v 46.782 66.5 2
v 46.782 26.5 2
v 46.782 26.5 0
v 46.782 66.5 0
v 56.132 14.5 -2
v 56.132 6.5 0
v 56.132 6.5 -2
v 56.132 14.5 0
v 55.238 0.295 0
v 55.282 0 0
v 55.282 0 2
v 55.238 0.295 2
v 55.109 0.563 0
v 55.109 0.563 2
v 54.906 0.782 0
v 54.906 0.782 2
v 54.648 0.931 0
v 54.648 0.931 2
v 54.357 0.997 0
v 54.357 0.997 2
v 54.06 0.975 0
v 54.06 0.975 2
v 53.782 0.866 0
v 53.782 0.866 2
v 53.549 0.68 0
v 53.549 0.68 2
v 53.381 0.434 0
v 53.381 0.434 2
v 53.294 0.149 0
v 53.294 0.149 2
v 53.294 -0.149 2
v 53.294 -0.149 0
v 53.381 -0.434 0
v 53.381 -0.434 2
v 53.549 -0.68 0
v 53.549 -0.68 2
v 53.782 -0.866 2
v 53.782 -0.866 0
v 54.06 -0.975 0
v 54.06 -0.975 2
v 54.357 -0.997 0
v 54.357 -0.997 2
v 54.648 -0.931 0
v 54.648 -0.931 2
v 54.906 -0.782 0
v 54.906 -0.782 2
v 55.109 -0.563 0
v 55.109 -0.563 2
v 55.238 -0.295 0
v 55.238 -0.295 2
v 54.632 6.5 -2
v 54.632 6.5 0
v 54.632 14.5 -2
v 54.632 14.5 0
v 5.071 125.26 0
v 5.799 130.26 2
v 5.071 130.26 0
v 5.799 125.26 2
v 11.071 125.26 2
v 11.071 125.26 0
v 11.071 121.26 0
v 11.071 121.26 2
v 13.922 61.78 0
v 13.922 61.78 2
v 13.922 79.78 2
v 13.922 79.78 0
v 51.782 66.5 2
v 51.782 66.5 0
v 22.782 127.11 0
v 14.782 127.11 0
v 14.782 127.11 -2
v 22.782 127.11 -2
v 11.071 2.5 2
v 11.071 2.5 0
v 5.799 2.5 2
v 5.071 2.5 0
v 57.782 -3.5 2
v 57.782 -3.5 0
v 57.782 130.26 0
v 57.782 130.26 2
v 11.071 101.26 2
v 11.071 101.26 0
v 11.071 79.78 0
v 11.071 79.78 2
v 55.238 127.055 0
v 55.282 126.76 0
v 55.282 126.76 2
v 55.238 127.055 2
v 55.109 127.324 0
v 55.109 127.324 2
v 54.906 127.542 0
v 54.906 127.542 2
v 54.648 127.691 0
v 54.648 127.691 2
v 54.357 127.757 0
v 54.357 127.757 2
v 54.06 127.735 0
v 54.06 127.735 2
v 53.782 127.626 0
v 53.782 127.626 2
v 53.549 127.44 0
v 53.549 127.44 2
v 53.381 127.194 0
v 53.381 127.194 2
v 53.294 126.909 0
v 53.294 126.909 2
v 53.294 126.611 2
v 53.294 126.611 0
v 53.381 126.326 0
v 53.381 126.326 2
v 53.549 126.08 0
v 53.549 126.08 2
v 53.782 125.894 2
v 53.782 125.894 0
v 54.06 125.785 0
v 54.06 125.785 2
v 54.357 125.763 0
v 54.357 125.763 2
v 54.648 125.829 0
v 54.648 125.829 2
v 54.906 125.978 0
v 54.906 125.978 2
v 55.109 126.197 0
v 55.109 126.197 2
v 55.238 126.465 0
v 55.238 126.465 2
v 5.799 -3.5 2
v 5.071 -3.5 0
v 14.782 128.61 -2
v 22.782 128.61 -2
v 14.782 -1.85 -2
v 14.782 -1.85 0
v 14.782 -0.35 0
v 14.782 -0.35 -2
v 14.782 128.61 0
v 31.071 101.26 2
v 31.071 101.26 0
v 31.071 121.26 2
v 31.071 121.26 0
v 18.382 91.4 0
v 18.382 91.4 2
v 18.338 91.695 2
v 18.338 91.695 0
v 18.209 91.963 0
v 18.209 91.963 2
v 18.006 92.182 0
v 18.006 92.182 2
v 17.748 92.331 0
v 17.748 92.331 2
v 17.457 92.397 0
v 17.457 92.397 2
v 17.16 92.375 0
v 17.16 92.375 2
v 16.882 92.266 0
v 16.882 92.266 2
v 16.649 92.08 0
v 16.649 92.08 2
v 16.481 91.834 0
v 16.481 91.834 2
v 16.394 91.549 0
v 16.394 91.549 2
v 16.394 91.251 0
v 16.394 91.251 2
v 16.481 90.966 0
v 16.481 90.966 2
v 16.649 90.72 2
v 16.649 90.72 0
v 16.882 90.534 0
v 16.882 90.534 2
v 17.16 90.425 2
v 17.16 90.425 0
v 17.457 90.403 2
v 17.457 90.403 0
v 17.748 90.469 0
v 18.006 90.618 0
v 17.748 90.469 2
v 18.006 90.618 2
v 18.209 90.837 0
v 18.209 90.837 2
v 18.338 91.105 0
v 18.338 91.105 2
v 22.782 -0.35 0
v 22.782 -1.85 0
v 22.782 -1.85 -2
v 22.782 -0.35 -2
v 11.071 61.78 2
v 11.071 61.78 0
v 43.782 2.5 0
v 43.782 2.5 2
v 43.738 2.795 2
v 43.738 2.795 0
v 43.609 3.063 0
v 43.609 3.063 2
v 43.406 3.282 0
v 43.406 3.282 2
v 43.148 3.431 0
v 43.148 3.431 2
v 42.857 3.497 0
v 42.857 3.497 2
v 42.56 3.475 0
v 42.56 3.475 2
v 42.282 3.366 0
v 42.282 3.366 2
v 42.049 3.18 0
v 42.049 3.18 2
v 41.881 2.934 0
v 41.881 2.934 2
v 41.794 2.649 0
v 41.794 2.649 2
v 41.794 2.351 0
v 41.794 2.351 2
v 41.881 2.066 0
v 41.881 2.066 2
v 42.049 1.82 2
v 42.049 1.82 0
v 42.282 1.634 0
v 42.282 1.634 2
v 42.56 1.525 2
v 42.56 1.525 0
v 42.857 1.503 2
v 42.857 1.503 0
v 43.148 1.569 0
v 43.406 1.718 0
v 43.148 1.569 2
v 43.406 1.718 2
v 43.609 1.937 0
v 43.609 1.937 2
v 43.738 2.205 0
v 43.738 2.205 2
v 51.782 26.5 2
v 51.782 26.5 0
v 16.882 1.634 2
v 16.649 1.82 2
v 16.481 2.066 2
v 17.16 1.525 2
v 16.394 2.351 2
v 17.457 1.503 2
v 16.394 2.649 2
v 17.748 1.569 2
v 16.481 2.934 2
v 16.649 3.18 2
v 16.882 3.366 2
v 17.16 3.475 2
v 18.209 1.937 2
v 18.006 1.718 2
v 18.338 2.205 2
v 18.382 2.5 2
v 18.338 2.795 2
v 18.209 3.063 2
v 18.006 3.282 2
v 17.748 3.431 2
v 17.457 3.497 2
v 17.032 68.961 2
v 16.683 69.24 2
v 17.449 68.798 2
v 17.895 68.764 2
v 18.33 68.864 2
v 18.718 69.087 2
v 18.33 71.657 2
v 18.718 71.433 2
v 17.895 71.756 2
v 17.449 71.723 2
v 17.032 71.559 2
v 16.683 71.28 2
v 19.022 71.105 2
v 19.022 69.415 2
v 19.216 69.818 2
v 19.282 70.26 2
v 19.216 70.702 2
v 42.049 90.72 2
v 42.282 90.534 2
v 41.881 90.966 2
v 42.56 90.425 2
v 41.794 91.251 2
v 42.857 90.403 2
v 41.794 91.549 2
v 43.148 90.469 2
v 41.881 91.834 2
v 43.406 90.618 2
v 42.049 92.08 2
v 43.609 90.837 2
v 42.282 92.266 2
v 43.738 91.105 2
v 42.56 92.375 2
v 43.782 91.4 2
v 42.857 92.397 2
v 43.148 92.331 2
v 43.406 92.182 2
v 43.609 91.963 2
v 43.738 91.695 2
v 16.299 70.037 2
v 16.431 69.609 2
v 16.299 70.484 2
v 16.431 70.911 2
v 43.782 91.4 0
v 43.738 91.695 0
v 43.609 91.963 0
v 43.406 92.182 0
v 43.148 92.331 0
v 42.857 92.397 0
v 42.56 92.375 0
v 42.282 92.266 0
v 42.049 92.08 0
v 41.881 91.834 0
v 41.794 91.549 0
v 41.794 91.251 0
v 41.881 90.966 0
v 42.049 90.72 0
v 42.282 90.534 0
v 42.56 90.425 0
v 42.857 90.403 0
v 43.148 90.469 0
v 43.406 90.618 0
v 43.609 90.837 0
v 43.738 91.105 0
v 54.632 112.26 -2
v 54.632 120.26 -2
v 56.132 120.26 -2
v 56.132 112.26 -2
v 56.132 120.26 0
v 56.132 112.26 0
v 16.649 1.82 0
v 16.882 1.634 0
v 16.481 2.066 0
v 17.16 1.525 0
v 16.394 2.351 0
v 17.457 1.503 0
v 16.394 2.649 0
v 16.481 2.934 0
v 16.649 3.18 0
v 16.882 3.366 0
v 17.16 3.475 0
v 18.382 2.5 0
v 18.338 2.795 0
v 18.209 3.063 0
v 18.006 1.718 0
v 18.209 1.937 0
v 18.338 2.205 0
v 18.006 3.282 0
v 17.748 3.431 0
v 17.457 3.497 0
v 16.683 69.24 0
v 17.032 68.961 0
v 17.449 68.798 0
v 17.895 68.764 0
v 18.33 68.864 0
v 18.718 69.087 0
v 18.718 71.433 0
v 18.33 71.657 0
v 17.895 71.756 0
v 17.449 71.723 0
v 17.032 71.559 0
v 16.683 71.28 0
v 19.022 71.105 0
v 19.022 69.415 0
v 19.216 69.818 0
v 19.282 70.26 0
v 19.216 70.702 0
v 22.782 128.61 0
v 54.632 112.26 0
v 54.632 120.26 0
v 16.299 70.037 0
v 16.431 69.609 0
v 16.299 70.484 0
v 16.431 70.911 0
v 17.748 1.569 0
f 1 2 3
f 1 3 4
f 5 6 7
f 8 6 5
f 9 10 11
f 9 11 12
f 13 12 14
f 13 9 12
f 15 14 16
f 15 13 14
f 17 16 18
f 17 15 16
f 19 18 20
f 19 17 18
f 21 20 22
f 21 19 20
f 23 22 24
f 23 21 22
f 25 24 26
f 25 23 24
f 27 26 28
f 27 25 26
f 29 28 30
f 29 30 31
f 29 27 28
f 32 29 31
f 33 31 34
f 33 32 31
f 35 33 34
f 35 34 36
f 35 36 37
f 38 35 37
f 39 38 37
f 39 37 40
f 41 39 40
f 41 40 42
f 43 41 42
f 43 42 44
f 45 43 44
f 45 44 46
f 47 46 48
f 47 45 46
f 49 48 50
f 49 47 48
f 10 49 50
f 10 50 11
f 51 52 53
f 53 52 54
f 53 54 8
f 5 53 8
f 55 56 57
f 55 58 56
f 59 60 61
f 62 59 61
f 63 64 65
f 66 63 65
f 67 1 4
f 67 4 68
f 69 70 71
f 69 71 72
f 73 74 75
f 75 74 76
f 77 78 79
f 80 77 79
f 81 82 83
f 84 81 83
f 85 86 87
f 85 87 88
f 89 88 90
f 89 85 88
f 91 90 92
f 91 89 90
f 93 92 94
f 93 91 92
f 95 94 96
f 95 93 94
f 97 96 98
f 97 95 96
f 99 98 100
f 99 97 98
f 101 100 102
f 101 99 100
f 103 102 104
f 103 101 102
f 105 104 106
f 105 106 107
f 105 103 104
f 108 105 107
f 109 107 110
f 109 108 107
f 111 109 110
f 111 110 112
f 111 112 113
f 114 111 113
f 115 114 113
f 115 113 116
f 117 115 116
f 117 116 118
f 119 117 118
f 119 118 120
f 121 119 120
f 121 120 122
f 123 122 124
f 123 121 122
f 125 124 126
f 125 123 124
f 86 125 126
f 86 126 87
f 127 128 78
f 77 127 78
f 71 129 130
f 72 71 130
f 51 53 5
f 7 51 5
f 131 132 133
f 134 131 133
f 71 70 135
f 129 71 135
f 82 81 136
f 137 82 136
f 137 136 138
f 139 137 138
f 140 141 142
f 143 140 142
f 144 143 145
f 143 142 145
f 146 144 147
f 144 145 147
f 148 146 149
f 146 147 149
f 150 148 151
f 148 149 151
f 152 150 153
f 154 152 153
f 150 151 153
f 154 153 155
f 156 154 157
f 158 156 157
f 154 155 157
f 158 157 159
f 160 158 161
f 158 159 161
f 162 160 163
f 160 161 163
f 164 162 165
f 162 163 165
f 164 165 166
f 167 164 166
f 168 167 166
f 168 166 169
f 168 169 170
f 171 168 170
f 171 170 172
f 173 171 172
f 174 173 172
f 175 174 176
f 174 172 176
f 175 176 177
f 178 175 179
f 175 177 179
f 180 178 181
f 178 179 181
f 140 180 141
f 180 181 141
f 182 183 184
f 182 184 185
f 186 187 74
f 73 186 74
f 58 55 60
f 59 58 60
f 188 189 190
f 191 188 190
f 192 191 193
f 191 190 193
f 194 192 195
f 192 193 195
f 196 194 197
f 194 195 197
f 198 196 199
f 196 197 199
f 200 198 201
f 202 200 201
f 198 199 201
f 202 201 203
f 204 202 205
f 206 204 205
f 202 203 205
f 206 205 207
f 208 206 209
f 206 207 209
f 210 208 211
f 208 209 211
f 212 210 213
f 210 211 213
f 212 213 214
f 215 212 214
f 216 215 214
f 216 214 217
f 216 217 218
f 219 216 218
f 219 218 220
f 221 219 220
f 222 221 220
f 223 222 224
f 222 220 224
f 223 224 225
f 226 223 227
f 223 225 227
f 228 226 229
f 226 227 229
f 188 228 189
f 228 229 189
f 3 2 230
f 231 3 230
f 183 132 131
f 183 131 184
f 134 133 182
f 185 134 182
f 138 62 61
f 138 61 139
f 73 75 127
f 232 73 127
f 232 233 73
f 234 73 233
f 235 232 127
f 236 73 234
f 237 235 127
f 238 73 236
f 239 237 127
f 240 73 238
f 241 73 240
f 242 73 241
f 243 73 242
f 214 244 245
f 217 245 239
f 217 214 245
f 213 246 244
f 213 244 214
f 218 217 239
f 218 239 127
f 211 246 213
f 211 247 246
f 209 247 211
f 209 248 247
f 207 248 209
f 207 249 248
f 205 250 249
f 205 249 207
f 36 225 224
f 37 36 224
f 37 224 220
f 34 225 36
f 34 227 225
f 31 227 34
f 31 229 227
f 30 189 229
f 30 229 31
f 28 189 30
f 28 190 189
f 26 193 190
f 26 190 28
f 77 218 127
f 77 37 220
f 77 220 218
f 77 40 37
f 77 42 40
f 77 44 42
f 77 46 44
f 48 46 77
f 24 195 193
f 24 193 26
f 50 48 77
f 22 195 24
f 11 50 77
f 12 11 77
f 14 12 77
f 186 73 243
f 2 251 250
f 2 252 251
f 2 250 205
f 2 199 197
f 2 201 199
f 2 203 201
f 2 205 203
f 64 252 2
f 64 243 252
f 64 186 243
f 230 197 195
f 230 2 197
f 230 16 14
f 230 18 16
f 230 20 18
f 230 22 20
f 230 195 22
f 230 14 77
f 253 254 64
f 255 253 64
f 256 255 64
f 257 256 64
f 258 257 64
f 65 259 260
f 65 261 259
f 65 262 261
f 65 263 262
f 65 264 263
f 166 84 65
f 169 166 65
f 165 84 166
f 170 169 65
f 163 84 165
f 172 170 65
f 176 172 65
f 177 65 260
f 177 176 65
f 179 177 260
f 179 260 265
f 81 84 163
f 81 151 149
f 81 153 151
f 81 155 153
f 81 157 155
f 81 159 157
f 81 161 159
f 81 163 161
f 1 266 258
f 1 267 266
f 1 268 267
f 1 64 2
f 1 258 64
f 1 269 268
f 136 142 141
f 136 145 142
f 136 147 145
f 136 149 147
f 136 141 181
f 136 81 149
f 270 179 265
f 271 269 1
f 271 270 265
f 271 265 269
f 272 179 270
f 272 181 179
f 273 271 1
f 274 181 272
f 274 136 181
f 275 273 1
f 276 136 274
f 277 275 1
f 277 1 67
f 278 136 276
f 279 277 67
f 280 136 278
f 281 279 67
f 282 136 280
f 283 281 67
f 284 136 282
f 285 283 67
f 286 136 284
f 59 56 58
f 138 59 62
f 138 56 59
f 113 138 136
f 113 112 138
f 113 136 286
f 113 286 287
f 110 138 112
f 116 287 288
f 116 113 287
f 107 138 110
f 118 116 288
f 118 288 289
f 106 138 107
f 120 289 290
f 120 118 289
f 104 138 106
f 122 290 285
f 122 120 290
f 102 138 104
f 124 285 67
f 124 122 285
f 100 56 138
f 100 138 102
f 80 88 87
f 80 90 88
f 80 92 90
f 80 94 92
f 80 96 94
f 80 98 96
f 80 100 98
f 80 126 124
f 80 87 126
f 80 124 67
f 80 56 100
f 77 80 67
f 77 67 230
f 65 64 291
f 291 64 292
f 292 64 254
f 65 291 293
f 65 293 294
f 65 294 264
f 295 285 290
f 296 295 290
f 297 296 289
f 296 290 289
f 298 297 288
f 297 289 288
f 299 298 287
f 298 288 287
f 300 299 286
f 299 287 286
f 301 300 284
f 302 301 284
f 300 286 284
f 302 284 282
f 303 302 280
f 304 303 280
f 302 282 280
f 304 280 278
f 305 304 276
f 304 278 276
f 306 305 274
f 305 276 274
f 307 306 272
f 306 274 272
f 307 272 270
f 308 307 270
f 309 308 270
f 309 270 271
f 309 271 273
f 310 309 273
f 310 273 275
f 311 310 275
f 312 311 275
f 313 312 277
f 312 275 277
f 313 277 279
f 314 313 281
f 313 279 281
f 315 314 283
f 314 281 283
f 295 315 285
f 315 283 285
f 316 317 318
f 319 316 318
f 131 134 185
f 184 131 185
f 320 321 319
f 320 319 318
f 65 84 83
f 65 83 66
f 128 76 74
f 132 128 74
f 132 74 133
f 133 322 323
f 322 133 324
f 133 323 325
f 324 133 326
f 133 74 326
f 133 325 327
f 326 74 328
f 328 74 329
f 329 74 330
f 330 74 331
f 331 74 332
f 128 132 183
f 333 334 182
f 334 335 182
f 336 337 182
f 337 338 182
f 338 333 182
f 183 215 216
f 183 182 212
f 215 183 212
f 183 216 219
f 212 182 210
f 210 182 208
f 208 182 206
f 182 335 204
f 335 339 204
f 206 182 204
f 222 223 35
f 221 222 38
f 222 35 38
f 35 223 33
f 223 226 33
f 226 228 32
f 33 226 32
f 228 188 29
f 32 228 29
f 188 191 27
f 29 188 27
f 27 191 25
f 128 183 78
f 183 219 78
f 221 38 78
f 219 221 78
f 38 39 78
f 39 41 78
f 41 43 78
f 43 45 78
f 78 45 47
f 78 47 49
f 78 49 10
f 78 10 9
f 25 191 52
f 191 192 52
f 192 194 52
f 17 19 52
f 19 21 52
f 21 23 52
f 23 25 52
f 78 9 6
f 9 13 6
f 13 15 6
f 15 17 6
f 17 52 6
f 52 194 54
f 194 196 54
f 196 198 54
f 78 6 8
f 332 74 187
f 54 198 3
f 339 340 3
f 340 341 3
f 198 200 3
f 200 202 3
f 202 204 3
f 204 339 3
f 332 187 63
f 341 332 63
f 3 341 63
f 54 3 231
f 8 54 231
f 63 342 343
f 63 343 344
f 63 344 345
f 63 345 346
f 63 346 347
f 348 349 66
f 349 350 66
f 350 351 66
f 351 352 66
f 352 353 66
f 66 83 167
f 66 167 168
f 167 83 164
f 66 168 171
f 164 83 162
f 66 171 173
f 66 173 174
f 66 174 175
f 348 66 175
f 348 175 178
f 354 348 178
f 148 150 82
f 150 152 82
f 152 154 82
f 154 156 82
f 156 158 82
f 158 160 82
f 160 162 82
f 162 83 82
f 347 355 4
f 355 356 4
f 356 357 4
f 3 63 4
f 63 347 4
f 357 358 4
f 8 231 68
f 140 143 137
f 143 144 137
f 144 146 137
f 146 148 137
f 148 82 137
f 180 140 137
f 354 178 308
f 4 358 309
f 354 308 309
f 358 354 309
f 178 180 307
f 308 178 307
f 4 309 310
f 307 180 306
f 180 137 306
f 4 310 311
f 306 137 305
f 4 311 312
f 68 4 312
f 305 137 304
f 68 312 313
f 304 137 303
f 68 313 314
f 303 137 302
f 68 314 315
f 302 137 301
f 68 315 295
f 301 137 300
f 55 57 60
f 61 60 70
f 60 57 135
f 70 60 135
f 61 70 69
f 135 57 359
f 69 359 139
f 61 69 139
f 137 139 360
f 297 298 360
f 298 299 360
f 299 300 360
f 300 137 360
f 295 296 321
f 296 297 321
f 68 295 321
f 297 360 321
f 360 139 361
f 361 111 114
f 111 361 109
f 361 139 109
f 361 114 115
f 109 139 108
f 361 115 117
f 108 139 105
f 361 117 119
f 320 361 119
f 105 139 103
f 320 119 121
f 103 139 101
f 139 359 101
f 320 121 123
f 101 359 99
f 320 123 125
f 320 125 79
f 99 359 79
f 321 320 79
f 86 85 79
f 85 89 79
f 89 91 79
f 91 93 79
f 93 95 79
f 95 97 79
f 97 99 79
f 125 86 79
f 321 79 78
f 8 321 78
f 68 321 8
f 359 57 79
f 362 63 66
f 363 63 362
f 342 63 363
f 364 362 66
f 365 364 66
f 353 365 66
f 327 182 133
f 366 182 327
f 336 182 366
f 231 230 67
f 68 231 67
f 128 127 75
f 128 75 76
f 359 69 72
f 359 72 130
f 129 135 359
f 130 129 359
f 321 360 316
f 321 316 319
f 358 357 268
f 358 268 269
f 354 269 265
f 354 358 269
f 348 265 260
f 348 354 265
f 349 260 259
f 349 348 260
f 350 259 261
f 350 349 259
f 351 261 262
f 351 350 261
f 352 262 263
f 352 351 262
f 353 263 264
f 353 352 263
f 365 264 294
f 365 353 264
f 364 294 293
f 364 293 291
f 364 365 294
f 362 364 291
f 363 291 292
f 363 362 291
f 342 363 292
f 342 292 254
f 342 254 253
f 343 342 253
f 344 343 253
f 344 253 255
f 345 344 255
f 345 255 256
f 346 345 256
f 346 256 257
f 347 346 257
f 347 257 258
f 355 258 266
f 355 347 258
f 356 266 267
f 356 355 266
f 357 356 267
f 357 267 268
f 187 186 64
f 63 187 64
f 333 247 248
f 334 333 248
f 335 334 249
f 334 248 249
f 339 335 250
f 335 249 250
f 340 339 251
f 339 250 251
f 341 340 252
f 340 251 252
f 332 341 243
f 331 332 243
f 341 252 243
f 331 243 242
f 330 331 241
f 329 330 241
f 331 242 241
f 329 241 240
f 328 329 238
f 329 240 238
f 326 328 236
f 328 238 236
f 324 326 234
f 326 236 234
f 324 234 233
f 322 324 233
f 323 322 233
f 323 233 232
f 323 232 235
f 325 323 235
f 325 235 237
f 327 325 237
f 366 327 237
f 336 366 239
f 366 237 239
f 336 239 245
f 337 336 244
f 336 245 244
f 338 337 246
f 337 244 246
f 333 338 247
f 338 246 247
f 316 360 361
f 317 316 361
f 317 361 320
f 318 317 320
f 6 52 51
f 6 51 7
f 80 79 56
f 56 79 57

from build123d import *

# Parameters (mm, degrees)
SKETCH1_R           = 1
SKETCH1_R_2         = 1.5
BOSS_EXTRUDE1_DEPTH = 2
CUT_EXTRUDE1_DEPTH  = 146.720996494
SKETCH3_W           = 5
SKETCH3_H           = 40
SKETCH3_W_2         = 20
SKETCH3_H_2         = 20
SKETCH3_W_3         = 28
SKETCH3_H_3         = 18
CUT_EXTRUDE2_DEPTH  = 2
SKETCH4_R           = 1
CUT_EXTRUDE3_DEPTH  = 2
SKETCH5_W           = 8
SKETCH5_H           = 1.5
SKETCH5_W_2         = 1.5
SKETCH5_H_2         = 8
BOSS_EXTRUDE2_DEPTH = 4


with BuildPart() as part:
    # Sketch1 → Boss-Extrude1 (new body)
    with BuildSketch(Plane.XY):
        Polygon((5.071460992, -3.5), (57.78242964, -3.5), (57.78242964, 130.260231922), (5.071460992, 130.260231922), (5.071460992, 125.260231922), (11.071460992, 125.260231922), (11.071460992, 2.5), (5.071460992, 2.5), align=None)
        with Locations((54.28242964, 0)):
            Circle(SKETCH1_R, mode=Mode.SUBTRACT)
        with Locations((54.28242964, 126.760231922)):
            Circle(SKETCH1_R, mode=Mode.SUBTRACT)
        with Locations((17.78242964, 70.260231922)):
            Circle(SKETCH1_R_2, mode=Mode.SUBTRACT)
    extrude(amount=BOSS_EXTRUDE1_DEPTH)

    # Sketch2 → Cut-Extrude1 (cut, through all)
    with BuildSketch(Plane.XZ.offset(3.5)):
        Polygon((6.036400554, 2.65114966), (1.157662204, -10.753073792), (3.527877144, 2.341321616), align=None)
    extrude(amount=-CUT_EXTRUDE1_DEPTH, mode=Mode.SUBTRACT)

    # Sketch3 → Cut-Extrude2 (cut)
    with BuildSketch(Plane.XY.offset(2)):
        with Locations((49.28242964, 46.5)):
            Rectangle(SKETCH3_W, SKETCH3_H)
        with Locations((21.071460992, 111.260231922)):
            Rectangle(SKETCH3_W_2, SKETCH3_H_2)
        with Locations((-0.078047732, 70.780115961)):
            Rectangle(SKETCH3_W_3, SKETCH3_H_3)
    extrude(amount=-CUT_EXTRUDE2_DEPTH, mode=Mode.SUBTRACT)

    # Sketch4 → Cut-Extrude3 (cut)
    with BuildSketch(Plane.XY.offset(2)):
        with Locations((17.38242964, 2.5)):
            Circle(SKETCH4_R)
        with Locations((42.78242964, 2.5)):
            Circle(SKETCH4_R)
        with Locations((42.78242964, 91.4)):
            Circle(SKETCH4_R)
        with Locations((17.38242964, 91.4)):
            Circle(SKETCH4_R)
    extrude(amount=-CUT_EXTRUDE3_DEPTH, mode=Mode.SUBTRACT)

    # Sketch5 → Boss-Extrude2 (add)
    with BuildSketch(Plane.XY.offset(2)):
        with Locations((18.78242964, 127.860231922)):
            Rectangle(SKETCH5_W, SKETCH5_H)
        with Locations((18.78242964, -1.1)):
            Rectangle(SKETCH5_W, SKETCH5_H)
        with Locations((55.38242964, 116.260231922)):
            Rectangle(SKETCH5_W_2, SKETCH5_H_2)
        with Locations((55.38242964, 10.5)):
            Rectangle(SKETCH5_W_2, SKETCH5_H_2)
    extrude(amount=-BOSS_EXTRUDE2_DEPTH)


solid = part.part
